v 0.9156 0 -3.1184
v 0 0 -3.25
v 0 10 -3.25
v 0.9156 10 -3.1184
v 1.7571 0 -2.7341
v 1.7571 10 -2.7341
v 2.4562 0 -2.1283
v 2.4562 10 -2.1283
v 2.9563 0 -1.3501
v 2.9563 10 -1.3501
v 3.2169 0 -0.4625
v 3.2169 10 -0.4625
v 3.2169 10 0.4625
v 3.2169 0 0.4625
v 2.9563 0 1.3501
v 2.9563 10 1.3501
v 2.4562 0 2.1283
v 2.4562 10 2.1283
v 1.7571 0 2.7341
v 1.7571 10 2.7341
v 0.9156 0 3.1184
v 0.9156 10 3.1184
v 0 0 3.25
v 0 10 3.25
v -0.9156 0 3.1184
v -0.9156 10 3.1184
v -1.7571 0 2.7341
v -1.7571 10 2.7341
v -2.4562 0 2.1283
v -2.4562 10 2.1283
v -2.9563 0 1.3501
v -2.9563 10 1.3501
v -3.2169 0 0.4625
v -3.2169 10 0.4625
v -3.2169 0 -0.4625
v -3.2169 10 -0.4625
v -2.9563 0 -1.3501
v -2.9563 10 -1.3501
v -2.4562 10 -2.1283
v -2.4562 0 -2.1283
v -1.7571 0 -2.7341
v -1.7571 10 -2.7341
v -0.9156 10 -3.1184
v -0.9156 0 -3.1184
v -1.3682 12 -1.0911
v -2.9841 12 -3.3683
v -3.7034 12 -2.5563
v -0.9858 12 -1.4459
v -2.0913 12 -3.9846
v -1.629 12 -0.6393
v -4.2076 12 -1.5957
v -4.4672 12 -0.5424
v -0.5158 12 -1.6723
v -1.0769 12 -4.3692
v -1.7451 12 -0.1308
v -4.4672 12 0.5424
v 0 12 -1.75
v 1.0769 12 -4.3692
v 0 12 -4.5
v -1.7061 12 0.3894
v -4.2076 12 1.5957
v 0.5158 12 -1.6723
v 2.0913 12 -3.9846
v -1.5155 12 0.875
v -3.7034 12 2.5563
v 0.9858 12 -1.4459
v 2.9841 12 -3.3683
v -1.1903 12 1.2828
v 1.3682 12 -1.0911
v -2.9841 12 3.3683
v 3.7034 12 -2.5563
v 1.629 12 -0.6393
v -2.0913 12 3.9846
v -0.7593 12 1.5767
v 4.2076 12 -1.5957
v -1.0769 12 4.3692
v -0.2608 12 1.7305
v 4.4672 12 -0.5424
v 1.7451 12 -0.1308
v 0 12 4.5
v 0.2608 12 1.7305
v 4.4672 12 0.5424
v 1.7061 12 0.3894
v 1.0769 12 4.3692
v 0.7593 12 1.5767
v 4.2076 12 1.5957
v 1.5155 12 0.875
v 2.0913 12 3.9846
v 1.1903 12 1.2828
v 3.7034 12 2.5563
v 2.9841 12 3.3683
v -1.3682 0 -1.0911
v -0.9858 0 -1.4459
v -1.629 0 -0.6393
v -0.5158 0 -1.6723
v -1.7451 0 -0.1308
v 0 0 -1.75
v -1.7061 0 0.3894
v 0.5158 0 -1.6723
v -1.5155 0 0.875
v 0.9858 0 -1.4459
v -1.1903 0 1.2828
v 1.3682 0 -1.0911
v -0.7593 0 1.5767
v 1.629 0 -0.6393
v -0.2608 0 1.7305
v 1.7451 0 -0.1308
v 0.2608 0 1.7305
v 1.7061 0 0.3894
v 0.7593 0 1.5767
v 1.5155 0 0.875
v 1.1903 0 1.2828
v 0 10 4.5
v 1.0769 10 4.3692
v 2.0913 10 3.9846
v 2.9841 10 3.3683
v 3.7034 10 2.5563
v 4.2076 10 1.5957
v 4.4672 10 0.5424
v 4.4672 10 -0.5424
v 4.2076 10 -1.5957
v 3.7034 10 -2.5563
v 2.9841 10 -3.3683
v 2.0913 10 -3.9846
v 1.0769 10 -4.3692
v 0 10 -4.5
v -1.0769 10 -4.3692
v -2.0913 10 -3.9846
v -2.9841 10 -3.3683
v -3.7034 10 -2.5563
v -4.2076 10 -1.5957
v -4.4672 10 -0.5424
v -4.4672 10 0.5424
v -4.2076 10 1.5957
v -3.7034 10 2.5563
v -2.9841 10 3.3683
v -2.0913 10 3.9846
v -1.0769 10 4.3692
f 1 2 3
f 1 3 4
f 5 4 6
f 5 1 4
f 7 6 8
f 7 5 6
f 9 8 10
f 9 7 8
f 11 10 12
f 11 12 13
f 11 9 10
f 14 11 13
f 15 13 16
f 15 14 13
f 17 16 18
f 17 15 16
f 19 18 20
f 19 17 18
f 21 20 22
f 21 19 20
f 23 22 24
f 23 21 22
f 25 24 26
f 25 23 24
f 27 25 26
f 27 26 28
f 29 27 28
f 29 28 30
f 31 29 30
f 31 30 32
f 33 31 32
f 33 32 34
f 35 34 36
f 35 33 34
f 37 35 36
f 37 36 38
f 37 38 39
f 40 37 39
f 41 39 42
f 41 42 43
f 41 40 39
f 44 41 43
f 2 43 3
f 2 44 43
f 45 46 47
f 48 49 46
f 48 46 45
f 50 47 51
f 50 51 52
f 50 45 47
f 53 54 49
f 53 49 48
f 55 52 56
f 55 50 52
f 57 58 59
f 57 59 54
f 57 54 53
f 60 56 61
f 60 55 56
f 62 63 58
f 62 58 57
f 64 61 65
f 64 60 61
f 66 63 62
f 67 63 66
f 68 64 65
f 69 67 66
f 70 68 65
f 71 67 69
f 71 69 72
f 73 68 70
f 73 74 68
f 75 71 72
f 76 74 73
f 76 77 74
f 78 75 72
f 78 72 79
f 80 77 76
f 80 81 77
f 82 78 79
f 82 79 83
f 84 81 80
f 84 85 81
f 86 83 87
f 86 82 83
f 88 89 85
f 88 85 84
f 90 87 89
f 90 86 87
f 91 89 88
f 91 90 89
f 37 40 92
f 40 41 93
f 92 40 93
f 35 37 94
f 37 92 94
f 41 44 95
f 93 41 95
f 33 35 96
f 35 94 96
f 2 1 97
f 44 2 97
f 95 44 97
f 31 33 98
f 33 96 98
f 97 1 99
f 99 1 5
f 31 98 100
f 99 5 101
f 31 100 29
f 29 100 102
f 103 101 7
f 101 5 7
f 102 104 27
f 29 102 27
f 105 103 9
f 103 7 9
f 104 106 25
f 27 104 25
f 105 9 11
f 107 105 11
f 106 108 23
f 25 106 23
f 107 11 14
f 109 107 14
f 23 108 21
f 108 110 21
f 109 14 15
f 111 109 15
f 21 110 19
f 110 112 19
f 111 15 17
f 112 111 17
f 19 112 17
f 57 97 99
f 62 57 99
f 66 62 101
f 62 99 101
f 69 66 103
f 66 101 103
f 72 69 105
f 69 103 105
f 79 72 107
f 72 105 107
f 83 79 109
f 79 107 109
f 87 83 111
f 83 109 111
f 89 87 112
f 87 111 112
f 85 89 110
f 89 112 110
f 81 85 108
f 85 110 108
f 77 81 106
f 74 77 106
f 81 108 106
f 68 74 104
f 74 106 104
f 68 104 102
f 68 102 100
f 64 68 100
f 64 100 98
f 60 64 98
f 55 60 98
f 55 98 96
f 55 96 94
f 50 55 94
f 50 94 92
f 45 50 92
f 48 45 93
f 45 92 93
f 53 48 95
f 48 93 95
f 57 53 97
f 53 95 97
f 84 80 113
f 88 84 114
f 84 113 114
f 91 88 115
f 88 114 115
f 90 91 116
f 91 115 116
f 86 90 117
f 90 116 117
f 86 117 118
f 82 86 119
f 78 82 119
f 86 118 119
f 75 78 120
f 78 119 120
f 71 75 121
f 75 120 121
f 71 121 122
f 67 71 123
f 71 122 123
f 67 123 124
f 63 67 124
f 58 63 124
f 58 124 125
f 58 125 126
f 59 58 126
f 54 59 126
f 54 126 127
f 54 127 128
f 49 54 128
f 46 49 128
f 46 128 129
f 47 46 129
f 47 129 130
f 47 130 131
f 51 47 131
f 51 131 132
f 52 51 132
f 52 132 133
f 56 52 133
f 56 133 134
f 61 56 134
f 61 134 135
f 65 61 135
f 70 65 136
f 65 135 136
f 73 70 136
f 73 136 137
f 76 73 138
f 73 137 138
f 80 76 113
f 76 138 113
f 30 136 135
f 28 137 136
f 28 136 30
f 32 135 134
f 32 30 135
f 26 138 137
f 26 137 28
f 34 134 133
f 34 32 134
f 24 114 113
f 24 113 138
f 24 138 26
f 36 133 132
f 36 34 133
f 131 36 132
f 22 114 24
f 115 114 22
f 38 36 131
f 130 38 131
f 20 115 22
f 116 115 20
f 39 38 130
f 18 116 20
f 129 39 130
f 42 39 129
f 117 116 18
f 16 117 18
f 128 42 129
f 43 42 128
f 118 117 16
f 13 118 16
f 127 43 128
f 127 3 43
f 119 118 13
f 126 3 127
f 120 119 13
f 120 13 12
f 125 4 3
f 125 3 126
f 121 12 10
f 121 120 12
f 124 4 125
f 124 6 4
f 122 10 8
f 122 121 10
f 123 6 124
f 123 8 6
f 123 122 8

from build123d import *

# Parameters (mm, degrees)
SKETCH1_R           = 4.5
BOSS_EXTRUDE1_DEPTH = 12
SKETCH3_R           = 4.5
SKETCH3_R_2         = 3.25
CUT_EXTRUDE1_DEPTH  = 10
SKETCH4_R           = 1.75
CUT_EXTRUDE2_DEPTH  = 12


with BuildPart() as part:
    # Sketch1 → Boss-Extrude1 (new body)
    with BuildSketch(Plane(origin=(0, 0, 0), x_dir=(1, 0, 0), z_dir=(0, 1, 0))):
        with Locations(Location((0, 0, 0), (0, 0, 270))):
            Circle(SKETCH1_R)
    extrude(amount=BOSS_EXTRUDE1_DEPTH)

    # Sketch3 → Cut-Extrude1 (cut)
    with BuildSketch(Plane(origin=(0, 0, 0), x_dir=(-1, 0, 0), z_dir=(0, -1, 0))):
        with Locations(Location((0, 0, 0), (0, 0, 90))):
            Circle(SKETCH3_R)
        with Locations(Location((0, 0, 0), (0, 0, 90))):
            Circle(SKETCH3_R_2, mode=Mode.SUBTRACT)
    extrude(amount=-CUT_EXTRUDE1_DEPTH, mode=Mode.SUBTRACT)

    # Sketch4 → Cut-Extrude2 (cut)
    with BuildSketch(Plane(origin=(0, 0, 0), x_dir=(-1, 0, 0), z_dir=(0, -1, 0))):
        with Locations(Location((0, 0, 0), (0, 0, 90))):
            Circle(SKETCH4_R)
    extrude(amount=-CUT_EXTRUDE2_DEPTH, mode=Mode.SUBTRACT)


solid = part.part
